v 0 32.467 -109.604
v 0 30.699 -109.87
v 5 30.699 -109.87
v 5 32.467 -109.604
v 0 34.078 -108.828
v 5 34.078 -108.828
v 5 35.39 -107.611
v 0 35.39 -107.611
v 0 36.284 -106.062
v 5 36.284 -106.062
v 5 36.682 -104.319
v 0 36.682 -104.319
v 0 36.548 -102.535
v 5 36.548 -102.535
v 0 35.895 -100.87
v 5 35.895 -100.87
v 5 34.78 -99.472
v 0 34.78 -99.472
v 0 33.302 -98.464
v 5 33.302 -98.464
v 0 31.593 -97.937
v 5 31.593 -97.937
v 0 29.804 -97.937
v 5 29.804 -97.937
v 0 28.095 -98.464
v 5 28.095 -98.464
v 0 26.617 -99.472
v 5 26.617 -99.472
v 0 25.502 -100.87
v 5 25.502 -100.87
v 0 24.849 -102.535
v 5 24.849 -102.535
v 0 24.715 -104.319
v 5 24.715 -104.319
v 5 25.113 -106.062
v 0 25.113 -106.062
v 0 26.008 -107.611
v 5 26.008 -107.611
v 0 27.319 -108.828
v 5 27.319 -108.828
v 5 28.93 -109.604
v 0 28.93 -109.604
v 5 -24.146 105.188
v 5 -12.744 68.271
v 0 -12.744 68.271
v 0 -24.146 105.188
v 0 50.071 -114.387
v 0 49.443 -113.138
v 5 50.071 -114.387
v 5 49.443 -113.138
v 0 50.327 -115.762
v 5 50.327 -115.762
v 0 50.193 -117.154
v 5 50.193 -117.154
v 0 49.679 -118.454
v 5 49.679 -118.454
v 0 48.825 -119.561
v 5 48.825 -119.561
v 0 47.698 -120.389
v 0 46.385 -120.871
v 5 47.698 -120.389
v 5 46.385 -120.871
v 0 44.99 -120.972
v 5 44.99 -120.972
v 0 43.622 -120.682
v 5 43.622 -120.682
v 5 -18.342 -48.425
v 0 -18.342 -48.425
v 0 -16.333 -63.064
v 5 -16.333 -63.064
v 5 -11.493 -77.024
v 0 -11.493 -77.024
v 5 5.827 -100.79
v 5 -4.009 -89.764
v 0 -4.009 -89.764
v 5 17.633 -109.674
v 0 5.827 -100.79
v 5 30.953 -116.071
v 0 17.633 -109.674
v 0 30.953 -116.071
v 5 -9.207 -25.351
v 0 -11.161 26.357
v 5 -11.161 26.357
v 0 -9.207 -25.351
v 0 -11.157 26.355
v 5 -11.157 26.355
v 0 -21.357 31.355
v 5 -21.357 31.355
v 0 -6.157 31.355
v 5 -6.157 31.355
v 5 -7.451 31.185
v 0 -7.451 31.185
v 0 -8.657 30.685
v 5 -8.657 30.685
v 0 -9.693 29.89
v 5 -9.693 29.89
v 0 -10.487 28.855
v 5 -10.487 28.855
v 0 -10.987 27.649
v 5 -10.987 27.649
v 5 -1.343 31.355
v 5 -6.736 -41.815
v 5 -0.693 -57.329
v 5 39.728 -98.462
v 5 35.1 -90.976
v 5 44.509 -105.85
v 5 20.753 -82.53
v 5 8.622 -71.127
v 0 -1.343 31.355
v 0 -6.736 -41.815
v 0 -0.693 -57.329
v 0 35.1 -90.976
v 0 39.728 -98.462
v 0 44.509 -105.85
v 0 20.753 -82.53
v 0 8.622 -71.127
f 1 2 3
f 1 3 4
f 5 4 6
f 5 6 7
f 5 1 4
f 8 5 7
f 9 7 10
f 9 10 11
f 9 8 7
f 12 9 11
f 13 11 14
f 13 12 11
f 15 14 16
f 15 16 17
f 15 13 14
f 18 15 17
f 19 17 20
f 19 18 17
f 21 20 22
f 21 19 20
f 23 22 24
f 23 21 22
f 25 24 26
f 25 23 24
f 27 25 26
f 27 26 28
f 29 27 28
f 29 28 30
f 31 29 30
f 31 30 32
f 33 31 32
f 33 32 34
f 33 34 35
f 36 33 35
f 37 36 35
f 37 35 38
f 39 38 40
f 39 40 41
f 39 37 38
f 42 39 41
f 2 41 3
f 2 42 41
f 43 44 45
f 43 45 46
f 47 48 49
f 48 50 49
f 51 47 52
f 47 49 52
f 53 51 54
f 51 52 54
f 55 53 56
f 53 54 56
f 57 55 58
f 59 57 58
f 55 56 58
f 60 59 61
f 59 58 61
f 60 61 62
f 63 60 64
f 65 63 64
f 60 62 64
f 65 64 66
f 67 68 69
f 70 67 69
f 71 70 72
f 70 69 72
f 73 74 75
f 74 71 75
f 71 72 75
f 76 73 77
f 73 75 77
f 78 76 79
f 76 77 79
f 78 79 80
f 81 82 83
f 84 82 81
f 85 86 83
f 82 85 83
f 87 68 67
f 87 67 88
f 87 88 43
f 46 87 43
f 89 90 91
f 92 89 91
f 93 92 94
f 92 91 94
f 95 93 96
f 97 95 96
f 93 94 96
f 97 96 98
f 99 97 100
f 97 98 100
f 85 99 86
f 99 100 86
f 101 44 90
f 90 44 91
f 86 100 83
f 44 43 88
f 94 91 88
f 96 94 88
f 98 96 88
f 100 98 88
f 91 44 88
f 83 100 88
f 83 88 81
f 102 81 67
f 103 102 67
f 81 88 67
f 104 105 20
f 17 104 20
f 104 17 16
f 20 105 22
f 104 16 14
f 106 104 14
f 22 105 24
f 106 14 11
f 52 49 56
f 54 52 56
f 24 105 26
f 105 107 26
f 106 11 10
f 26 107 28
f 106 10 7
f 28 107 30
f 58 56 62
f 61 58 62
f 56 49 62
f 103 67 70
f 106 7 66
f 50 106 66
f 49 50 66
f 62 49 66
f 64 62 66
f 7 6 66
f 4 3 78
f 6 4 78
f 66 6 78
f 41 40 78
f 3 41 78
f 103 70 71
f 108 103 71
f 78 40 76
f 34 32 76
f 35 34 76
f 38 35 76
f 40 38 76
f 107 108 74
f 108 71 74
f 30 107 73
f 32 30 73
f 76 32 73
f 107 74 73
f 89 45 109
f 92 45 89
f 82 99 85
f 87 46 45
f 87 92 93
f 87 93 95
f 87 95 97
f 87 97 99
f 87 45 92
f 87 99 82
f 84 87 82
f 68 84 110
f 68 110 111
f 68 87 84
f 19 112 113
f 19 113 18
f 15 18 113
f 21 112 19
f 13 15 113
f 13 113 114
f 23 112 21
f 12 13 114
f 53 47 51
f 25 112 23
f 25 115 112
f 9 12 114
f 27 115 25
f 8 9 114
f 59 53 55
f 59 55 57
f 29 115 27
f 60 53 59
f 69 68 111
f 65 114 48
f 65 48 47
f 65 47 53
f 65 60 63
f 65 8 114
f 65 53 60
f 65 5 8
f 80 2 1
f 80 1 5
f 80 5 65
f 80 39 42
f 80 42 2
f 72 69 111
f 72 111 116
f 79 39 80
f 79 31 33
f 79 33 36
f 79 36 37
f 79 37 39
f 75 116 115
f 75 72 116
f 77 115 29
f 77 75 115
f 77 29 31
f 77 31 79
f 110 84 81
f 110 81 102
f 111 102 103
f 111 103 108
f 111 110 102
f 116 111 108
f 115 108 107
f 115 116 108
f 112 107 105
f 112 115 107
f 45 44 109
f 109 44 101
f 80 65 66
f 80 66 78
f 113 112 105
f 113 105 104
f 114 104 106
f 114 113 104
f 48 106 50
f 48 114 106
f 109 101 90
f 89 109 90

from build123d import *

# Parameters (mm, degrees)
SKETCH_1_R          = 6
EXTRUDE_1_DEPTH     = 5
FILLET_1_R          = 5
FILLET_2_R          = 75
FILLET_3_R          = 5
EXTRUDE_2_DEPTH     = 5
CUT_EXTRUDE_2_DEPTH = 160.415234704


with BuildPart() as part:
    # Эскиз1 → Бобышка-Вытянуть1 (new body)
    with BuildSketch(Plane(origin=(0, 0, 0), x_dir=(0, 0, -1), z_dir=(1, 0, 0))):
        with BuildLine():
            Line((126.237664014, 58.886284382), (98.821729218, -16.438377404))
            Line((98.821729218, -16.438377404), (-151.178270782, -25.884067346))
            Line((-151.178270782, -25.884067346), (-77.345590471, -3.080194644))
            Line((-77.345590471, -3.080194644), (-77.345590471, -13.087329783))
            Line((-77.345590471, -13.087329783), (75.539410437, -7.310912522))
            Line((75.539410437, -7.310912522), (90.975731778, 35.100031802))
            ThreePointArc((90.975731778, 35.100031802), (108.905022115, 46.550907327), (126.237664014, 58.886284382))
        make_face()
        with Locations((103.870185422, 30.698515365)):
            Circle(SKETCH_1_R, mode=Mode.SUBTRACT)
    extrude(amount=EXTRUDE_1_DEPTH)

    # Скругление1
    fillet_1_edges = [part.edges().sort_by_distance(p)[0] for p in [
        (2.5, -13.087329783, 77.345590471),
    ]]
    fillet(fillet_1_edges, radius=FILLET_1_R)

    # Скругление2
    # the kernel refuses this fillet: 75 mm, written as the material it adds along each edge
    with BuildSketch(Plane(origin=(0, -7.310912522, -75.539410437), x_dir=(0, -0.037755820465347284, 0.9992869948223027), z_dir=(1, 0, 0))) as fillet_2_piece_1:
        with BuildLine():
            CenterArc((50.223853574, -75), FILLET_2_R, 90, 63.724056715)
            Line((-17.026575163, -41.797894123), (0, 0))
            Line((0, 0), (50.223853574, 0))
        make_face()
    extrude(amount=5)
    # the kernel refuses this fillet: 75 mm, written as the material it takes off along each edge
    with BuildSketch(Plane(origin=(-126.080854452, -16.438377404, -98.821729218), x_dir=(0, -0.03775582046534733, 0.9992869948223025), z_dir=(1, 0, 0))) as fillet_2_2_piece_1:
        with BuildLine():
            CenterArc((FILLET_2_R * 0.672431223743, -FILLET_2_R), FILLET_2_R, 90, 67.836236553)
            Line((-FILLET_2_R * 0.253678140212, -FILLET_2_R * 0.622744852924), (0, 0))
            Line((0, 0), (FILLET_2_R * 0.672431223743, 0))
        make_face()
    extrude(amount=257.161708904, mode=Mode.SUBTRACT)

    # Скругление3
    fillet_3_edges = [part.edges().sort_by_distance(p)[0] for p in [
        (2.5, 58.886284382, -126.237664014),
    ]]
    fillet(fillet_3_edges, radius=FILLET_3_R)

    # Эскиз4 → Бобышка-Вытянуть2 (add)
    with BuildSketch(Plane(origin=(5, 0, 0), x_dir=(0, 0, -1), z_dir=(1, 0, 0))):
        with BuildLine():
            Line((-105.187577254, -24.146412021), (-31.354896943, -1.342539319))
            Line((-31.354896943, -1.342539319), (-31.354896943, -6.15719309))
            ThreePointArc((-31.354896943, -6.15719309), (-29.890430849, -9.692726996), (-26.354896943, -11.15719309))
            Line((-26.354896943, -11.15719309), (-31.354896943, -21.356809597))
            Line((-31.354896943, -21.356809597), (-105.187577254, -24.146412021))
        make_face()
    extrude(amount=-EXTRUDE_2_DEPTH)

    # Эскиз5 → Вырез-Вытянуть2 (cut, through all)
    with BuildSketch(Plane(origin=(5, 0, 0), x_dir=(0, 0, -1), z_dir=(1, 0, 0))):
        Polygon((-38.471521652, -3.540571454), (-146.983243384, -37.055371114), (-175.325798577, -14.870573448), (-65.732340229, 27.748343591), align=None)
    extrude(amount=-CUT_EXTRUDE_2_DEPTH, mode=Mode.SUBTRACT)


solid = part.part
